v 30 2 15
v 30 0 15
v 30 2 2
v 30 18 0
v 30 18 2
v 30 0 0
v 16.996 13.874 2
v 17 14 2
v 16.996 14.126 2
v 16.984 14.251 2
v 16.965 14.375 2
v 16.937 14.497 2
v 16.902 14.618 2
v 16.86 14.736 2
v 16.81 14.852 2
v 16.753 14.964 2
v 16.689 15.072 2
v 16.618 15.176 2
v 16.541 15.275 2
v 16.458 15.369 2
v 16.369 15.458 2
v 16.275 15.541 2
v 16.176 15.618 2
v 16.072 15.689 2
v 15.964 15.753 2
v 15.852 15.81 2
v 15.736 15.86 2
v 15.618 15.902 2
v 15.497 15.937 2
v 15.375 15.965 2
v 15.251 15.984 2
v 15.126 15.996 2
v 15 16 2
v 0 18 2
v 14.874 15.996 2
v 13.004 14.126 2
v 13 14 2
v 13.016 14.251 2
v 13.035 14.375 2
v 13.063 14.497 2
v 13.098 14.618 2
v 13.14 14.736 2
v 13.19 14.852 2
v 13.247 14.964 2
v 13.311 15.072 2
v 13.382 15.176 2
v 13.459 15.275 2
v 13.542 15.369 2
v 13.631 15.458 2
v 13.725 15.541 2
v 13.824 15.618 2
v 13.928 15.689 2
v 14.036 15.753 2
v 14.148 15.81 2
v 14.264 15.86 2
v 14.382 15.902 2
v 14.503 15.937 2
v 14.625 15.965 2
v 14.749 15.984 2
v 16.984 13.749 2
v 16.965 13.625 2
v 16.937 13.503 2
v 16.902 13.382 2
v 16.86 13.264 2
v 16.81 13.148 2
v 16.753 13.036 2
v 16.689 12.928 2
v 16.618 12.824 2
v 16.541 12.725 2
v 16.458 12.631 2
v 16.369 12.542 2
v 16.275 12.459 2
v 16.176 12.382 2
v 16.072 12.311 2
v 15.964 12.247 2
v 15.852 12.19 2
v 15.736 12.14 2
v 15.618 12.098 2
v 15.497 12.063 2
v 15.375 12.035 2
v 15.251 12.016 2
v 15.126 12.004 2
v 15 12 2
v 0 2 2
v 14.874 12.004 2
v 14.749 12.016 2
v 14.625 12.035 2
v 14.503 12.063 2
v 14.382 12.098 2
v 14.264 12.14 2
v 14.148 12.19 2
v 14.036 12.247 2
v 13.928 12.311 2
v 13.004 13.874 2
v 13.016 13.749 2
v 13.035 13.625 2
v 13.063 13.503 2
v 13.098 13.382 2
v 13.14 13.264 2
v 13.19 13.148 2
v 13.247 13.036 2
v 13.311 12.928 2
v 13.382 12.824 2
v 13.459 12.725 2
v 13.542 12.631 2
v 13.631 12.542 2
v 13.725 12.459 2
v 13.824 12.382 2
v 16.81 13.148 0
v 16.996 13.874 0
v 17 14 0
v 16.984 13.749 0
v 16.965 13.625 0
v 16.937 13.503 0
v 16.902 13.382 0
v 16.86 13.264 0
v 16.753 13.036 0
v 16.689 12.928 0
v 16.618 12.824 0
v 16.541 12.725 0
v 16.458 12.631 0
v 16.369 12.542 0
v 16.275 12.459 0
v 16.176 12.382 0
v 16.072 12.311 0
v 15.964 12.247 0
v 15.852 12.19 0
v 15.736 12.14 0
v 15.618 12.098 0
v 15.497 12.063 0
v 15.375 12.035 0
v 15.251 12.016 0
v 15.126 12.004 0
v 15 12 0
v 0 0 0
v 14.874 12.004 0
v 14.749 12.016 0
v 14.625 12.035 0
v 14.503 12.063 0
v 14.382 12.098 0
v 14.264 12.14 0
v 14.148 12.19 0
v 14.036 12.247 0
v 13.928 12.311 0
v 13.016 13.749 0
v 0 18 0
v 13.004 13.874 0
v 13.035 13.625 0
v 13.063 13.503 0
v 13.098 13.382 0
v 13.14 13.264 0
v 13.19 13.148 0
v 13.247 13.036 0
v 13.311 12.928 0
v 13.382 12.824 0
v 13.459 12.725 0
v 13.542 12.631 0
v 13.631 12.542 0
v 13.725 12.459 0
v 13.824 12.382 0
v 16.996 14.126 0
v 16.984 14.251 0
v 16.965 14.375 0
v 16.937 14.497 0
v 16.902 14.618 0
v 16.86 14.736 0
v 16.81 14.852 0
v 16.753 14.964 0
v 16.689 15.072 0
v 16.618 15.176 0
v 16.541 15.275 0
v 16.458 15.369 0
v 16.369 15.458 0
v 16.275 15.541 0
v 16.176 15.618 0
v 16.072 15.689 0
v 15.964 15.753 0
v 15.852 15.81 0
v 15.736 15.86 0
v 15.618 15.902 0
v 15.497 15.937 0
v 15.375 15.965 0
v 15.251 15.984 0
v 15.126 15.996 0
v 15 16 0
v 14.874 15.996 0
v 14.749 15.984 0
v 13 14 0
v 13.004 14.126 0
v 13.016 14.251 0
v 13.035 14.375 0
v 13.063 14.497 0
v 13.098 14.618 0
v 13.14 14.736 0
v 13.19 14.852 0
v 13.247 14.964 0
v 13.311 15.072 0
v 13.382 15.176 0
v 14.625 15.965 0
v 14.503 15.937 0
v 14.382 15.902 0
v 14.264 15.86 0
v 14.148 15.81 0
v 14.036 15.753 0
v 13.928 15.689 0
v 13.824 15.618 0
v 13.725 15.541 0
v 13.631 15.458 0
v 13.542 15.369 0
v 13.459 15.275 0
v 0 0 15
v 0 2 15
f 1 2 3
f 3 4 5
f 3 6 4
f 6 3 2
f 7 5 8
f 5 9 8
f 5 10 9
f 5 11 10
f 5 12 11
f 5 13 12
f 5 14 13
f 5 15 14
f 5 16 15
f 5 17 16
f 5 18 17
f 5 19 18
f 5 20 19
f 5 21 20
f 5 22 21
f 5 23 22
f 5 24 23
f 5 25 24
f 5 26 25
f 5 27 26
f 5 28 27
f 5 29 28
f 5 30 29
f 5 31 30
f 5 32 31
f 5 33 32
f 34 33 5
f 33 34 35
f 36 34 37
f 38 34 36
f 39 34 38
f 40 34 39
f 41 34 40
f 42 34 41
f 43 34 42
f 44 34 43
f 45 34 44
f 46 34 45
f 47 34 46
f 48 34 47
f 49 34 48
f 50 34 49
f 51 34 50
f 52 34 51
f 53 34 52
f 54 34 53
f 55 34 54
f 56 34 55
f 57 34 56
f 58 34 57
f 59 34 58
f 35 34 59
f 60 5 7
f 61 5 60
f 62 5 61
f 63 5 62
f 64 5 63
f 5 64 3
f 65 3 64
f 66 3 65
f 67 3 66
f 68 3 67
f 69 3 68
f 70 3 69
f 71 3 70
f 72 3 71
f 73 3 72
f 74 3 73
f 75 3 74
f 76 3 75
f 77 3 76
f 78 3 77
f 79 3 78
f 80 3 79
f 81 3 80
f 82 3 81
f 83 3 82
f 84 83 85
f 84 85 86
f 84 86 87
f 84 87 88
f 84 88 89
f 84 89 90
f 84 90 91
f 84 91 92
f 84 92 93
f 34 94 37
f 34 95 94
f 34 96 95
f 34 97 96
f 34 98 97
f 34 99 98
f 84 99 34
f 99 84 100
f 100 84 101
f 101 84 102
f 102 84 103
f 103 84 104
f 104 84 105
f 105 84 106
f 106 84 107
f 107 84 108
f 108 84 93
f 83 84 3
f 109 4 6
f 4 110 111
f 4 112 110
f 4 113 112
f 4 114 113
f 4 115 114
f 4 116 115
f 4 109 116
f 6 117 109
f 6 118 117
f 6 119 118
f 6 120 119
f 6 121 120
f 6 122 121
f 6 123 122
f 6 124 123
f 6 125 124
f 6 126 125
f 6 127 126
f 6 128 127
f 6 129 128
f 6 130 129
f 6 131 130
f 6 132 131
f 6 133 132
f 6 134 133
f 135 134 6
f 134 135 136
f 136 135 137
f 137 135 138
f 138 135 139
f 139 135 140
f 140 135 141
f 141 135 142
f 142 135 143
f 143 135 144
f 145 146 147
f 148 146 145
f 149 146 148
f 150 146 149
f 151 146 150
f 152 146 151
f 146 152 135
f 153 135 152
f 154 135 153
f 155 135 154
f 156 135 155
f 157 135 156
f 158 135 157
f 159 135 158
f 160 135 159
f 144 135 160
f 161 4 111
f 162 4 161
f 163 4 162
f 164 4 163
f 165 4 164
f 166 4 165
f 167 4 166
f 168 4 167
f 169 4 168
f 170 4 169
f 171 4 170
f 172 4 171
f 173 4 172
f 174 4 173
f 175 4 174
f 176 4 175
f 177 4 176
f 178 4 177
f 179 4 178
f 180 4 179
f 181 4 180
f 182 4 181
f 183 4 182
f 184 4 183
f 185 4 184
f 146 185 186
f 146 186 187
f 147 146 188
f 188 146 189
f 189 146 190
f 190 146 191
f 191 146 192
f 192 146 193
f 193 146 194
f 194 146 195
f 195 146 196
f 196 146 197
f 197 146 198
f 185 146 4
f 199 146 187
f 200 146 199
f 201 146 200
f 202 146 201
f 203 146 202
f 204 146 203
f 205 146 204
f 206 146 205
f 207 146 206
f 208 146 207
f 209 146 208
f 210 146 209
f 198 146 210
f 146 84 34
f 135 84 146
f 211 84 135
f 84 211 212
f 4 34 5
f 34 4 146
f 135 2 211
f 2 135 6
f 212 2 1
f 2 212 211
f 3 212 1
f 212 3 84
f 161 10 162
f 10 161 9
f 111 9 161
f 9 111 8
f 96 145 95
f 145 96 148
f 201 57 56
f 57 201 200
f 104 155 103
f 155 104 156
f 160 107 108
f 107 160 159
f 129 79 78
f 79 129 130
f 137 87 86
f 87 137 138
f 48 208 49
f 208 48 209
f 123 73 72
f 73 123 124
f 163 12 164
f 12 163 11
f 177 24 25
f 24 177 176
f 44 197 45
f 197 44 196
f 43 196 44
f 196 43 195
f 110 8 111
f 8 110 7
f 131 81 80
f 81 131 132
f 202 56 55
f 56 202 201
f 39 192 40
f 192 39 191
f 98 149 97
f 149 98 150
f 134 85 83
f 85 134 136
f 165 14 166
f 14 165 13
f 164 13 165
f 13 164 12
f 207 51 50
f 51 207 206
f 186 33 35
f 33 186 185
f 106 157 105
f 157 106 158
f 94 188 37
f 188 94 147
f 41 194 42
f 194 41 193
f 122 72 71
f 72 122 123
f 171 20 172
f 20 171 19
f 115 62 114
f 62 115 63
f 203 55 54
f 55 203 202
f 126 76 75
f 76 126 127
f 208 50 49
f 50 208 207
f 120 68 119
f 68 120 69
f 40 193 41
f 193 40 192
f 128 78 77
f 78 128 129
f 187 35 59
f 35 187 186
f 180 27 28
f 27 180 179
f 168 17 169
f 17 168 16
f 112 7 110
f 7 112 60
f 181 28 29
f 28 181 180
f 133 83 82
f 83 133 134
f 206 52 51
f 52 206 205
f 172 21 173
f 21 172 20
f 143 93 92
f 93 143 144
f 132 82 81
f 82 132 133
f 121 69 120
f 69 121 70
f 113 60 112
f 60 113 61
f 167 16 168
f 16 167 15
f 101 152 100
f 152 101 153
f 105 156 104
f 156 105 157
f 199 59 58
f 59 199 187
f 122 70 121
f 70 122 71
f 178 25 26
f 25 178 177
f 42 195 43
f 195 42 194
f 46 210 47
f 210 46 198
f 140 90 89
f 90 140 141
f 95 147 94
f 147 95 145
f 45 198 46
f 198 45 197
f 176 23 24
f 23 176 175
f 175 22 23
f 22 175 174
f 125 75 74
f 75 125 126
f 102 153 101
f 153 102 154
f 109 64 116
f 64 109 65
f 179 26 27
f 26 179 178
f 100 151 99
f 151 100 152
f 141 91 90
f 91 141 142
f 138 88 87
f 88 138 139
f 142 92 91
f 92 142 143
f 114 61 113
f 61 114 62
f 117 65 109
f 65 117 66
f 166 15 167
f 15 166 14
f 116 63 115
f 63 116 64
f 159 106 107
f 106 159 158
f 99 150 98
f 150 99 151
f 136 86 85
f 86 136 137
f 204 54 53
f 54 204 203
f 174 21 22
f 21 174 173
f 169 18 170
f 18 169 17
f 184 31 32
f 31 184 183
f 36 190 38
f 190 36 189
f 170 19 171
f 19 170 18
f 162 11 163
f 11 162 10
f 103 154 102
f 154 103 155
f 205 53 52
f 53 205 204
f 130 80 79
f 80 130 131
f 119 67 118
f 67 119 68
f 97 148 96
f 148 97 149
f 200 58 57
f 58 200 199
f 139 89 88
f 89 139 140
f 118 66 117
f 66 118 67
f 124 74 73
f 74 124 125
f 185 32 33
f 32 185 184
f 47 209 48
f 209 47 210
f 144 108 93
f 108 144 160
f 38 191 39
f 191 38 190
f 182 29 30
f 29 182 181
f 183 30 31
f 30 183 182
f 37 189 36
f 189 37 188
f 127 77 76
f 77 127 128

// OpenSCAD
difference(){
	union(){



        translate([0,0,0]){
           cube([30,18,2], center=false);
        }        
        translate([0,0,0]){
           cube([30,2,15], center=false);
        }        




        
	}
	union() {
        translate([15,14,-1]){
            rotate([0,0,0]){
               cylinder(h=999, r=2, $fn=100, center=false);
            }
        }

	}
}
